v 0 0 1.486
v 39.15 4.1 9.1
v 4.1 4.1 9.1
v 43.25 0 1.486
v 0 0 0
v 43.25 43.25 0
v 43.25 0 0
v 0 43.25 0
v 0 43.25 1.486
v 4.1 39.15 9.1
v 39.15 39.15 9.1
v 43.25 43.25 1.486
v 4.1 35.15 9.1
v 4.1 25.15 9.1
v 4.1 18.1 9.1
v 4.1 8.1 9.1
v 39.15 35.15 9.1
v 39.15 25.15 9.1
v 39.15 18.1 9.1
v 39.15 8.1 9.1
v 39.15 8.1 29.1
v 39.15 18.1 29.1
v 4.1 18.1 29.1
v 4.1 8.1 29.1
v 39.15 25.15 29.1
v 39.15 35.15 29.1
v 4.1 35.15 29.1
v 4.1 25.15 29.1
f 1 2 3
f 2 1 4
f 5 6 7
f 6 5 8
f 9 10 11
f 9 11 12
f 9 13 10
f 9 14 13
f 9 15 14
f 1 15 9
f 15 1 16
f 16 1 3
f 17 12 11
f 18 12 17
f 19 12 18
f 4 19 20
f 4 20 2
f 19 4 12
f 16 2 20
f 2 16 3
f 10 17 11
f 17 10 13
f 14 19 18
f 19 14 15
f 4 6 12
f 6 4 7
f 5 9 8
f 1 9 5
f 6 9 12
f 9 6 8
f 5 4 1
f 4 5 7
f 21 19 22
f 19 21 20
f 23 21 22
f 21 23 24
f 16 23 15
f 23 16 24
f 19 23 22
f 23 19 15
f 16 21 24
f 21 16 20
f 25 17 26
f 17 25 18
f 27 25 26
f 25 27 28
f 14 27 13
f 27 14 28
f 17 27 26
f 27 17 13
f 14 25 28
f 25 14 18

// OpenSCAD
// Phone width in mm (iPhone4/S=9.3, iPhone5=7.6, iPhone6=7.05)
phone_width=7.05;

// Width of the base of your tripod mount
base_width=43.25;

// Height of the slanted area of your tripod mount
base_height=9.1;

// Difference in width between the base and top of the mount
base_inset=4.1;

// Difference in width between the base bottom width and width if it hadn't been chopped off
base_cutout = 0.8;

// Width of the holder bars
holder_width=10;

// Height of the holder bars
holder_height=20;

base_width_2 = base_width + base_cutout;

phone_width_2 = phone_width + 0.05; // add a tiny bit of extra so phone can slide in

union() {

// base
intersection() {
    //slanted cube
	polyhedron(points=[[-base_cutout,-base_cutout,0],
                   [base_inset,base_inset,base_height],
                   [-base_cutout,base_width+base_cutout,0],
                   [base_inset,base_width-base_inset,base_height],
                   [base_width+base_cutout,base_width+base_cutout,0],
                   [base_width-base_inset,base_width-base_inset,base_height],
                   [base_width+base_cutout,-base_cutout,0],
                   [base_width-base_inset,base_inset,base_height]],
           triangles=[[2,1,0],[1,2,3],[4,3,2],[3,4,5],[6,5,4],[5,6,7],[0,7,6],[7,0,1],
				     [4,2,0],[0,6,4],[1,3,5],[5,7,1]]
           );
	
	//whatever the bigger shape, clip it to base_width
	cube([base_width,base_width,50]);
}

// phone holder
translate([base_inset,base_width-base_width/2-holder_width-phone_width/2,base_height]) 
	cube([base_width-base_inset*2,holder_width,holder_height]);
translate([base_inset,base_width-base_width/2+phone_width/2,base_height])
	cube([base_width-base_inset*2,holder_width,holder_height]);

}
